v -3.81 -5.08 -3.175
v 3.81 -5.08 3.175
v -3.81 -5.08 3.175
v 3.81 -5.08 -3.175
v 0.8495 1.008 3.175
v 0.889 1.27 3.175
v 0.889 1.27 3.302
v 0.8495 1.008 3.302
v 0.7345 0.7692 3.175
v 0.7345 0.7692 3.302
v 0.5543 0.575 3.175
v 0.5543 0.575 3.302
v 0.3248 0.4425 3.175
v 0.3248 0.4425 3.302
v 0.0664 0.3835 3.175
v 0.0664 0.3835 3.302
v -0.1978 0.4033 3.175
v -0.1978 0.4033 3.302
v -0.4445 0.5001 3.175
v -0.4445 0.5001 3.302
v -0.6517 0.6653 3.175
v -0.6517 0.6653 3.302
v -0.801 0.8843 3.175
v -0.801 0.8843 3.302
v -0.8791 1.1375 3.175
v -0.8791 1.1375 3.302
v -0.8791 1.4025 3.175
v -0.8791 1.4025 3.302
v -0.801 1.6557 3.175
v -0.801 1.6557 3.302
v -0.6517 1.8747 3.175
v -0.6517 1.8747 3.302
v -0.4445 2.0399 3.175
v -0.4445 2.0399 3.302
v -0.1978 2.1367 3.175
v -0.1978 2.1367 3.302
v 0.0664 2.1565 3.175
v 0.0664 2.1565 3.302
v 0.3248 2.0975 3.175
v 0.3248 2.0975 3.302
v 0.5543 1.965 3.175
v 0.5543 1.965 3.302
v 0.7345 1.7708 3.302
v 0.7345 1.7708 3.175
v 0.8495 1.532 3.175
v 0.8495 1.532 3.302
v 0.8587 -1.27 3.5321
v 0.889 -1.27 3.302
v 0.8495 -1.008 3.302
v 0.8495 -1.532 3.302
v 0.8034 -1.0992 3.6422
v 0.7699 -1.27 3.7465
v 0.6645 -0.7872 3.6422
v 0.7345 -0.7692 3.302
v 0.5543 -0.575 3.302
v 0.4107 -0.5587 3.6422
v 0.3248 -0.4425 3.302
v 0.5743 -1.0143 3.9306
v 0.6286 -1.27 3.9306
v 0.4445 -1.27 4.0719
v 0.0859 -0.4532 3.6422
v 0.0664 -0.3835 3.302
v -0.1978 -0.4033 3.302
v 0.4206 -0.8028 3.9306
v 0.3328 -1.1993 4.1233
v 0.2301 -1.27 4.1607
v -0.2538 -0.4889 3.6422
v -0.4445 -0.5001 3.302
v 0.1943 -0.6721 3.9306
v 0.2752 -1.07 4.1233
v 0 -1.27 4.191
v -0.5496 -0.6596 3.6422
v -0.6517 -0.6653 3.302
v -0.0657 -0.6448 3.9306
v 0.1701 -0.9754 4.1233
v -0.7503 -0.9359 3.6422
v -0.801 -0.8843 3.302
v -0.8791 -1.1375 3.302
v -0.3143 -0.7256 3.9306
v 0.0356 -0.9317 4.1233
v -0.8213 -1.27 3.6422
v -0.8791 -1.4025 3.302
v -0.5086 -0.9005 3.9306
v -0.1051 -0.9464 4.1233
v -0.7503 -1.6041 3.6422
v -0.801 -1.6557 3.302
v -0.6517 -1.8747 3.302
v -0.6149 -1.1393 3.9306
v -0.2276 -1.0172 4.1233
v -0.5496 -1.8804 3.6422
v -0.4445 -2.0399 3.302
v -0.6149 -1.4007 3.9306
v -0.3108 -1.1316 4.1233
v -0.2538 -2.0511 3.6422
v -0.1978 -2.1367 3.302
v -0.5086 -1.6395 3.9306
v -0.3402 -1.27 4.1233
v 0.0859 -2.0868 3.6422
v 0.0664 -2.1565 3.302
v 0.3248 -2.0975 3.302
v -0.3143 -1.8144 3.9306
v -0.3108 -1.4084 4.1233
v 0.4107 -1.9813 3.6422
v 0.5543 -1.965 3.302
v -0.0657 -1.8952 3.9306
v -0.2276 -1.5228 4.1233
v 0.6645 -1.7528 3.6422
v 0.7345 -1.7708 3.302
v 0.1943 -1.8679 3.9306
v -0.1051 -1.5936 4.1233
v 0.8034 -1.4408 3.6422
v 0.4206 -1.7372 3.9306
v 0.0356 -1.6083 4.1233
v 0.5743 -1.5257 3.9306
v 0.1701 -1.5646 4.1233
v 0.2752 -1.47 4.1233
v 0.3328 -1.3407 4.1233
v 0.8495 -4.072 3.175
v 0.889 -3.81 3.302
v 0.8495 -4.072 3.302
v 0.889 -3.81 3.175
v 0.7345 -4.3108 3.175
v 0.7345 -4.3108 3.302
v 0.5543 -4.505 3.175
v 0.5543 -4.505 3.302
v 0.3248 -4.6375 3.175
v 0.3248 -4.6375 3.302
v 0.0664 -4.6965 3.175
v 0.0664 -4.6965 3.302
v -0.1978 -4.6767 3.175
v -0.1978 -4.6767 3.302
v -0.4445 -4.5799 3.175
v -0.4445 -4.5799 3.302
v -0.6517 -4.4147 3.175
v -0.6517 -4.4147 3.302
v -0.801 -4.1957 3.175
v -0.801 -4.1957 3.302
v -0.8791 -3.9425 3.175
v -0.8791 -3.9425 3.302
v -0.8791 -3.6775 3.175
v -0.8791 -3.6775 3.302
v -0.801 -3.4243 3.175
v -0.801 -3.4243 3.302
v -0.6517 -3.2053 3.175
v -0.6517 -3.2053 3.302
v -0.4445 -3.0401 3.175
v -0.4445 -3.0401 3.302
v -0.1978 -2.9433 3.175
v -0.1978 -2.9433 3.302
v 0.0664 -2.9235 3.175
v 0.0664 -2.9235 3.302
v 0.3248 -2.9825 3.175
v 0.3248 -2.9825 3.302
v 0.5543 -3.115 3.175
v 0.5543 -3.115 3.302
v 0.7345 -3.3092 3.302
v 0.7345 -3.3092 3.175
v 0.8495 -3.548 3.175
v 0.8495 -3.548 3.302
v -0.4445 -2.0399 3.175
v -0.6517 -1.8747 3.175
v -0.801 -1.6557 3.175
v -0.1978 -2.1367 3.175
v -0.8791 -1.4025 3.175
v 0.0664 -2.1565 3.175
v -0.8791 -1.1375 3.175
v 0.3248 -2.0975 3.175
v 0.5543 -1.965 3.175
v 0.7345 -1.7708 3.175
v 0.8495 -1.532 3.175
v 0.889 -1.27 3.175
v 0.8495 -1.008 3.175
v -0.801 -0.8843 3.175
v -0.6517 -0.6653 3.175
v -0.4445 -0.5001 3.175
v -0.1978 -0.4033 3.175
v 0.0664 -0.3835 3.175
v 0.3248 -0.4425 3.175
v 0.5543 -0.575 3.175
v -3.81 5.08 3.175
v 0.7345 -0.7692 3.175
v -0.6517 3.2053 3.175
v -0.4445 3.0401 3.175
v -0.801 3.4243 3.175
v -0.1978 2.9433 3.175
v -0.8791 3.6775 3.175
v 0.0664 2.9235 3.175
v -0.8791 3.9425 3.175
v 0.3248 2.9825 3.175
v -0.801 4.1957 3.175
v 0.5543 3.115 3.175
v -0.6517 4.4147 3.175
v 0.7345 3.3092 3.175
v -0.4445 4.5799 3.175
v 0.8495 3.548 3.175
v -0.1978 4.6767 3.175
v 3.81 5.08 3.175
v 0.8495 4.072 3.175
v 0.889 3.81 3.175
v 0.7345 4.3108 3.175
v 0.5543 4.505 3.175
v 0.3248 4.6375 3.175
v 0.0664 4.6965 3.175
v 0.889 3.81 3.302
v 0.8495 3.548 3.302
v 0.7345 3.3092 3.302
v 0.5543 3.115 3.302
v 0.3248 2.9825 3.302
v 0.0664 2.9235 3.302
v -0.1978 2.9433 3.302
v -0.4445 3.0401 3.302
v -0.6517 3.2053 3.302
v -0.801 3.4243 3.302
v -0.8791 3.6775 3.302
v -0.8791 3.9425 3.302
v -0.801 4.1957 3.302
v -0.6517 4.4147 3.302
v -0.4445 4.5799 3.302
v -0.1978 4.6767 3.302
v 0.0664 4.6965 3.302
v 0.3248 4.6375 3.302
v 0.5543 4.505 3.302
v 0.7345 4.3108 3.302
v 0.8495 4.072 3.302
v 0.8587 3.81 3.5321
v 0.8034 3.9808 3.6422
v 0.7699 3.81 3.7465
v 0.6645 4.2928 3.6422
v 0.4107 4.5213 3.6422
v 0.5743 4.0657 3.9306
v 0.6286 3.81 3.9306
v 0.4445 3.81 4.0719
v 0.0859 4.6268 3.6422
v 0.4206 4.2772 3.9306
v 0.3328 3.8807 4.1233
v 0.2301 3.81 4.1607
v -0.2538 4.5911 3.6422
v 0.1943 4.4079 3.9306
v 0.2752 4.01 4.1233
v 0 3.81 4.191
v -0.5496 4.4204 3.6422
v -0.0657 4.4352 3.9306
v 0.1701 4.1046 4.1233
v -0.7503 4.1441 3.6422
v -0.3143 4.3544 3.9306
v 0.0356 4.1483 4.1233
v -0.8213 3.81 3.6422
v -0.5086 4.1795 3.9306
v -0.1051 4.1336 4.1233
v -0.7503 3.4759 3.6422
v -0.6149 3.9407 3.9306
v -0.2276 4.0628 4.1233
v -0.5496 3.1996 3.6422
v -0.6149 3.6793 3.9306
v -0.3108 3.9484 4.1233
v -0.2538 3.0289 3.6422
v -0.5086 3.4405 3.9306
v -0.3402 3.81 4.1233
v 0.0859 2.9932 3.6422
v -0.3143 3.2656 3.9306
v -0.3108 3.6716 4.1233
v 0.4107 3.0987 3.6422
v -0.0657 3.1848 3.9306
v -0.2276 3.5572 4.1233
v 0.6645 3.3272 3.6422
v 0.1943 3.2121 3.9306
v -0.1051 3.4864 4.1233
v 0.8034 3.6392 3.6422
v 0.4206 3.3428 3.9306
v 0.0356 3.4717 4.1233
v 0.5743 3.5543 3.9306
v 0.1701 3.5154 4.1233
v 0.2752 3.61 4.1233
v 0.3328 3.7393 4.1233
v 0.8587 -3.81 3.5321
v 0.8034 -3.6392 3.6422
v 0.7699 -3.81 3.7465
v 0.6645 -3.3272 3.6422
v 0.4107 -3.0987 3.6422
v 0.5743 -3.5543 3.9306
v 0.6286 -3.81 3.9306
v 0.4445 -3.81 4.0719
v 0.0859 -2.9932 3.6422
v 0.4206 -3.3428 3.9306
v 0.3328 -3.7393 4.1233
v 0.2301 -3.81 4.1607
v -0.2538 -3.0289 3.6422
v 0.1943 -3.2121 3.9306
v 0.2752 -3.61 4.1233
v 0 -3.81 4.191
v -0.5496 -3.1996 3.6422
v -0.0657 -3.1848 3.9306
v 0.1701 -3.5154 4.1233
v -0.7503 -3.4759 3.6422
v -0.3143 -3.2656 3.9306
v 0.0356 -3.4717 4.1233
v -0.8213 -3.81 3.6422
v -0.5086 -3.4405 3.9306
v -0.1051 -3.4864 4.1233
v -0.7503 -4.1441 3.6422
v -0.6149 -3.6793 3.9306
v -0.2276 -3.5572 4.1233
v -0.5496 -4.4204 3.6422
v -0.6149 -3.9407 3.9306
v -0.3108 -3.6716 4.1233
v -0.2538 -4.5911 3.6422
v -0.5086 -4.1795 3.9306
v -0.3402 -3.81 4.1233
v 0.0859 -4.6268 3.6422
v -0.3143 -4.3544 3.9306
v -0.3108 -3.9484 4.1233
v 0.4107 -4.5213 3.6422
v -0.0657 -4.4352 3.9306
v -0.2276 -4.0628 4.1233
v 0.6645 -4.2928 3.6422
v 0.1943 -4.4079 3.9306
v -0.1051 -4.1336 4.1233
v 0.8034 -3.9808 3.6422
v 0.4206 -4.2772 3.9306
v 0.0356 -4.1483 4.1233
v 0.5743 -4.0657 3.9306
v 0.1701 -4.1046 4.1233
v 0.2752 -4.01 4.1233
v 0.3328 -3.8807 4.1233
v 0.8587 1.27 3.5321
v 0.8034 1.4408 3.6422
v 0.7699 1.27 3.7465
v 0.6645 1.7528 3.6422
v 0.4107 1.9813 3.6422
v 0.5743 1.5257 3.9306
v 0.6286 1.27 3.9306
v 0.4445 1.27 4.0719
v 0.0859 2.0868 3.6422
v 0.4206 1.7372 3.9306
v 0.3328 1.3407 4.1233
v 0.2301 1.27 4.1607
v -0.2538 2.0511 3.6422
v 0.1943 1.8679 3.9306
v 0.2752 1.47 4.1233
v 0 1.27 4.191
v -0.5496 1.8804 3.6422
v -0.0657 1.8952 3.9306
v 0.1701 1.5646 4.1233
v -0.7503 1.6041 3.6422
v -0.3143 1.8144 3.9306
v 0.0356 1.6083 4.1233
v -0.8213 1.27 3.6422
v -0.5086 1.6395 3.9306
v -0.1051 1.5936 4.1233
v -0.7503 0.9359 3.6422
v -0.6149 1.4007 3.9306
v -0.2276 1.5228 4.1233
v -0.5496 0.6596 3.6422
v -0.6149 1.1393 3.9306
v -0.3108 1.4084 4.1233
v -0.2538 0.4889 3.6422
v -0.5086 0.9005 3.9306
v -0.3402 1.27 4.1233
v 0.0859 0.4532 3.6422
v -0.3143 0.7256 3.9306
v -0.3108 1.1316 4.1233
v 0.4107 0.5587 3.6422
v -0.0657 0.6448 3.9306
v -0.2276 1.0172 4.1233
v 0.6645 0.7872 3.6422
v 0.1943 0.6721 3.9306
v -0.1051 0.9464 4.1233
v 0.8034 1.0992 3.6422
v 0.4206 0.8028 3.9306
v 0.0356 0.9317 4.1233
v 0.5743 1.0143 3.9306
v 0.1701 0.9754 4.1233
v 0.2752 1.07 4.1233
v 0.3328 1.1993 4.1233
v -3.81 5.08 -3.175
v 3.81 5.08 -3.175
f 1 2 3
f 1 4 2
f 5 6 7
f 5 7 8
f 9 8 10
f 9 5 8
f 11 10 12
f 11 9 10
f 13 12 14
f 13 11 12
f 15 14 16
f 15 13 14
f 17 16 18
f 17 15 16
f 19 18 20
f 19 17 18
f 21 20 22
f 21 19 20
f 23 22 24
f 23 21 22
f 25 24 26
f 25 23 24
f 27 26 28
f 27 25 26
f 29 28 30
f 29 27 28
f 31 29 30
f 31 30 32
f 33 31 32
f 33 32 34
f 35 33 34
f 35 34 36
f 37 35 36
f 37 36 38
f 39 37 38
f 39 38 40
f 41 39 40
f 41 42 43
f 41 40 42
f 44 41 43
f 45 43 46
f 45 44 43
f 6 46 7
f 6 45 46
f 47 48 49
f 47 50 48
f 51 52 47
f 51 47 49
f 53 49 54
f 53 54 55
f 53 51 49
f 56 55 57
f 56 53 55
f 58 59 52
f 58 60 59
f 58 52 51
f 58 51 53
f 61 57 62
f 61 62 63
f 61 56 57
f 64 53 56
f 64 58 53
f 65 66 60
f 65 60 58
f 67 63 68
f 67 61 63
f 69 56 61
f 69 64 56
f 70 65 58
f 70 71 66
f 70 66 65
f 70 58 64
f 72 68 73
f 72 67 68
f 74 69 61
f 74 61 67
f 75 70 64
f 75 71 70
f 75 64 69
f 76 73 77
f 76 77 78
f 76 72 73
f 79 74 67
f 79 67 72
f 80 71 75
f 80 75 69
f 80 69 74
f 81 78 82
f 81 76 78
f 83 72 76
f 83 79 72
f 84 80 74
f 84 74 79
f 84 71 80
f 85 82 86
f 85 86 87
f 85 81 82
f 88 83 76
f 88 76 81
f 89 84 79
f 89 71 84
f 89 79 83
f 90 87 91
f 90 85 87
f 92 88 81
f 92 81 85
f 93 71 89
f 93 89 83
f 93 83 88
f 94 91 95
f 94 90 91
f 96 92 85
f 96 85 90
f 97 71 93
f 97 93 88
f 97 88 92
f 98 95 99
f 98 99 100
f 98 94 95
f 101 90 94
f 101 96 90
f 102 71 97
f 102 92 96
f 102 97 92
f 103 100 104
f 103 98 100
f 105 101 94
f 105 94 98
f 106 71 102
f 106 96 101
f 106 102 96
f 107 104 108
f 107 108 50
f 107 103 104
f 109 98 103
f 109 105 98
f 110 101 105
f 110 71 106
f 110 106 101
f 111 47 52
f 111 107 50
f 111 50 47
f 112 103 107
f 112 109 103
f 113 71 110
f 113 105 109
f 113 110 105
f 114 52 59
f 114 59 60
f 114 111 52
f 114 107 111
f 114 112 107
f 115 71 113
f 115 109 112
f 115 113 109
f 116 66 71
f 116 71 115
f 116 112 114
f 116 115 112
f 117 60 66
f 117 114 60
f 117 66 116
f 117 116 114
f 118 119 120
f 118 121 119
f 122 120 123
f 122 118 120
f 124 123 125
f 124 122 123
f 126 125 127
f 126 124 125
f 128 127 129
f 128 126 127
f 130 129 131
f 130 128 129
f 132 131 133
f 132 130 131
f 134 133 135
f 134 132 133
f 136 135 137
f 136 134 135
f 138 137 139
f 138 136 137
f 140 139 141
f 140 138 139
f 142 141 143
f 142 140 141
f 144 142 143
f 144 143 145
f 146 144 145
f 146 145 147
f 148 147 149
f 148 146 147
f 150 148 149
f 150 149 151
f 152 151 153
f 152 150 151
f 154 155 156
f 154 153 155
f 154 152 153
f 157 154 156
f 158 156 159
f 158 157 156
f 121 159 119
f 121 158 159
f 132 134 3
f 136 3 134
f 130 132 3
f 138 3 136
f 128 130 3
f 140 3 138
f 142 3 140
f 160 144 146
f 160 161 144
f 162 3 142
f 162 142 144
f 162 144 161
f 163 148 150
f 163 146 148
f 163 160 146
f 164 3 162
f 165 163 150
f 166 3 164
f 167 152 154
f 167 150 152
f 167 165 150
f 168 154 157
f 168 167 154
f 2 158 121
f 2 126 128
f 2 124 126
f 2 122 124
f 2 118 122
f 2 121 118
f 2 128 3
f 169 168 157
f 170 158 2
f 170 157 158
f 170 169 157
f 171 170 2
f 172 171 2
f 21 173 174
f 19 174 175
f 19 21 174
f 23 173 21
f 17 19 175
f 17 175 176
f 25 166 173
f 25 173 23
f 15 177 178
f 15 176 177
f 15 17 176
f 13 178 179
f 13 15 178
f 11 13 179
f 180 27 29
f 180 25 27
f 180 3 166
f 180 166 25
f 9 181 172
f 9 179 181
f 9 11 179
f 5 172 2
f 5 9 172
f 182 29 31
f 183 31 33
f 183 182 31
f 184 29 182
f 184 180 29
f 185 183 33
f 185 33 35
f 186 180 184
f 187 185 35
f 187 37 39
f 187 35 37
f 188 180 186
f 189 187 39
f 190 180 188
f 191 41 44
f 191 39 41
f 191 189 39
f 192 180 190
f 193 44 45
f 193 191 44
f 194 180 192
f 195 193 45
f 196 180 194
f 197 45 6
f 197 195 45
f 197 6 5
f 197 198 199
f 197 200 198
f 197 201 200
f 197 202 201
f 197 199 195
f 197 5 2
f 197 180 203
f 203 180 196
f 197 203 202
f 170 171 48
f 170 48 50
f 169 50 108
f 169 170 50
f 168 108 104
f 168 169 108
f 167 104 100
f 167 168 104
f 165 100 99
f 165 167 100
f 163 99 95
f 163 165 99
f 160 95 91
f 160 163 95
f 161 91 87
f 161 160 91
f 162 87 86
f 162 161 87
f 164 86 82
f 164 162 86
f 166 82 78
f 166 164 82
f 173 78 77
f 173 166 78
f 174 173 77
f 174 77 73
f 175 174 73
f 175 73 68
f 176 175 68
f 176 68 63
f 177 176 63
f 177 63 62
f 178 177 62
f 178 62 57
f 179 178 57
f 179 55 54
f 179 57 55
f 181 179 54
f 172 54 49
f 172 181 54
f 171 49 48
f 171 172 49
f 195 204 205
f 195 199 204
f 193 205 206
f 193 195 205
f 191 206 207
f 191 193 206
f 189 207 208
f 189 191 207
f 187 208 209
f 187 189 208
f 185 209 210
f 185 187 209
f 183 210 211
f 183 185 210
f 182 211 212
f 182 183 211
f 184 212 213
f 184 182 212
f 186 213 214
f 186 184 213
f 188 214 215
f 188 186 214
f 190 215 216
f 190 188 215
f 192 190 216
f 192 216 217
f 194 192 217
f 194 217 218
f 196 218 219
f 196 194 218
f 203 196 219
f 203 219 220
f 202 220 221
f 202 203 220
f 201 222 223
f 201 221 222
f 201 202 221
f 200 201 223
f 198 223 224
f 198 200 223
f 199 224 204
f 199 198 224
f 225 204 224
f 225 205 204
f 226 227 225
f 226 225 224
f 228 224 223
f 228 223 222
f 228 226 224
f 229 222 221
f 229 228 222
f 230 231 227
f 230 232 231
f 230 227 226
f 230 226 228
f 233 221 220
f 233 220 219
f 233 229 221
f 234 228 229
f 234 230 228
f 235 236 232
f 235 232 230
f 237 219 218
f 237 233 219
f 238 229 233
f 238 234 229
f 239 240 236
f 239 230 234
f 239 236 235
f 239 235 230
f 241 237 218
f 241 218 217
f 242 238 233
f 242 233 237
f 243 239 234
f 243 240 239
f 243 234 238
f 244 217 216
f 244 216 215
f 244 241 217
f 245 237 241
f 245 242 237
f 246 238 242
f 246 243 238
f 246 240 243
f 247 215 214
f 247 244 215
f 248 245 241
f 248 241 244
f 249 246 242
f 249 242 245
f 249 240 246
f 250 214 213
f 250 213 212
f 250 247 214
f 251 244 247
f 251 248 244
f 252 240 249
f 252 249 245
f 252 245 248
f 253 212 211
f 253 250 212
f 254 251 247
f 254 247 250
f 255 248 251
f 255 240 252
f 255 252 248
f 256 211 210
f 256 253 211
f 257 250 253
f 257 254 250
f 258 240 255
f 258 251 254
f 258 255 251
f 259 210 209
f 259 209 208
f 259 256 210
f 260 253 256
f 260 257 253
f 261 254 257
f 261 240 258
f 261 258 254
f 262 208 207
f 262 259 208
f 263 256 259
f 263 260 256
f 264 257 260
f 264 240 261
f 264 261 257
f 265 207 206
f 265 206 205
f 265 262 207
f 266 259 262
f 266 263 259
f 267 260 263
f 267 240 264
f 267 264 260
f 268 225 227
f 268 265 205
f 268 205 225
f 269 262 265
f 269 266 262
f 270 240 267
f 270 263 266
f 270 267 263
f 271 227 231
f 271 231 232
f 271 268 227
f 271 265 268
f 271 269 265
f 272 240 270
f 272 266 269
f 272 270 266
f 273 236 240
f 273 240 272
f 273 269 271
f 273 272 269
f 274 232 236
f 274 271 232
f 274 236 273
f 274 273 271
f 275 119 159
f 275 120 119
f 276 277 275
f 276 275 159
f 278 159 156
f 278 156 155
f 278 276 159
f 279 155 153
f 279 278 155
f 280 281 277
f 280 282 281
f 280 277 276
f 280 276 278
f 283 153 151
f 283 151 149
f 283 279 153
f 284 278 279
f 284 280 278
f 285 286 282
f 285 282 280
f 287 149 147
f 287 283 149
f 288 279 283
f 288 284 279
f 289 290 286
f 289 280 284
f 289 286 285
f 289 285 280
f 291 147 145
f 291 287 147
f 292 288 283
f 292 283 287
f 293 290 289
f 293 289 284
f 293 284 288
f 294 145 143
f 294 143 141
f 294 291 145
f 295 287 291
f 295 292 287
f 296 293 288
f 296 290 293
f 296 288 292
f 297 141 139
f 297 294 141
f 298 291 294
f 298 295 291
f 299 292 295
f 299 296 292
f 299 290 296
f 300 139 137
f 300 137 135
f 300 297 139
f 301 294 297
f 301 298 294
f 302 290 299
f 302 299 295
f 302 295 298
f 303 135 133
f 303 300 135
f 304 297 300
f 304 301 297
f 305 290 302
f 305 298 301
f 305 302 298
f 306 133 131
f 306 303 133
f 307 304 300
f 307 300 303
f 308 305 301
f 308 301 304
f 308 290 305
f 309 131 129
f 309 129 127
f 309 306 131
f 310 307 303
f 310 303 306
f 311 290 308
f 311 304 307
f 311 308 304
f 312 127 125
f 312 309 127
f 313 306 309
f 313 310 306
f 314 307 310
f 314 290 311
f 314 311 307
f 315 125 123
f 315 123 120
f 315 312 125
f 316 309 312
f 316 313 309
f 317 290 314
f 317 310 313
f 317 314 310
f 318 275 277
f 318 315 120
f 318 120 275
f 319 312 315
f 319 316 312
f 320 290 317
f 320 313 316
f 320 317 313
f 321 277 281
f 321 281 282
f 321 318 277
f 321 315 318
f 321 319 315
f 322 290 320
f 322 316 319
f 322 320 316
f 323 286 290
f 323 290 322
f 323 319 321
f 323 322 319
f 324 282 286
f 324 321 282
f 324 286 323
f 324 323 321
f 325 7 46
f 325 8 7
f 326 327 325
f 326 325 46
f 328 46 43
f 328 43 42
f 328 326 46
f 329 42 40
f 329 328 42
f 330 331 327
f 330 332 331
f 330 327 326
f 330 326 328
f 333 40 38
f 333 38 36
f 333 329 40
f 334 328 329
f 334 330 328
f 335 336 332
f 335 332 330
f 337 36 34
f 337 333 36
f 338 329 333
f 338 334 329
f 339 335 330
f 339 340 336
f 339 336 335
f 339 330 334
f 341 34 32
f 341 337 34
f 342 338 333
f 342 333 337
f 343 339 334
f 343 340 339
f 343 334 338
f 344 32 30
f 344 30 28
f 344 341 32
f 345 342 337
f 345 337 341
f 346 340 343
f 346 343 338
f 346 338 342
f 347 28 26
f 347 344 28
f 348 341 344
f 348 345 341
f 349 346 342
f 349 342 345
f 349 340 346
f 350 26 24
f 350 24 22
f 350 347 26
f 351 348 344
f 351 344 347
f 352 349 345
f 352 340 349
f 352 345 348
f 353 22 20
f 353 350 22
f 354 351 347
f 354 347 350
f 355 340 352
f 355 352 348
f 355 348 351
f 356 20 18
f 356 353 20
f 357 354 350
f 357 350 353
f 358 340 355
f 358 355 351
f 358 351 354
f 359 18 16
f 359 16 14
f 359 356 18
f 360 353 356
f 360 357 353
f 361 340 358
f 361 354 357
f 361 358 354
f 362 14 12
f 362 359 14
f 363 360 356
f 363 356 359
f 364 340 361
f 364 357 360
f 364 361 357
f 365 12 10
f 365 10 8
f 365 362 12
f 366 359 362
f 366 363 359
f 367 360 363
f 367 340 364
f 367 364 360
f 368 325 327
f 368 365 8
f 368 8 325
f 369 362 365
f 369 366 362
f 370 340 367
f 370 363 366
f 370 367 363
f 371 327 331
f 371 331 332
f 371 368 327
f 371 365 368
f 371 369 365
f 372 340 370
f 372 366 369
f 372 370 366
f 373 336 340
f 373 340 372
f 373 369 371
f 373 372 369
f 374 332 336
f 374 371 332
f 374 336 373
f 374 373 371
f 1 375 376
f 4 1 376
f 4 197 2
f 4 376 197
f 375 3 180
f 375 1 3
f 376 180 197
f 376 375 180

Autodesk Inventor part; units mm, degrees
ref_plane "YZ Plane" through (0, 0, 0) normal (1, 0, 0) x (0, 1, 0)
ref_plane "XZ Plane" through (0, 0, 0) normal (0, 1, 0) x (-1, 0, 0)
ref_plane "XY Plane" through (0, 0, 0) normal (0, 0, 1) x (1, 0, 0)
sketch "Sketch1" plane through (0, 0, 0) normal (0, 0, 1) x (1, 0, 0)
  line L0 (-3.81, 5.08) -> (3.81, 5.08)
  line L1 (3.81, 5.08) -> (3.81, -5.08)
  line L2 (3.81, -5.08) -> (-3.81, -5.08)
  line L3 (-3.81, -5.08) -> (-3.81, 5.08)
  line L4 (0, 0) -> (0, 5.08) construction
  line L5 (0, 0) -> (0, -5.08) construction
  line L6 (0, 0) -> (-3.81, 0) construction
  line L7 (0, 0) -> (3.81, 0) construction
  dimension "d0" = 7.62
  dimension "d1" = 10.16
extrude "Extrusion1" add sketch "Sketch1" along normal mid plane 6.35
sketch "Sketch2" plane through (0, 0, 3.175) normal (0, 0, 1) x (1, 0, 0)
  line L0 (-3.81, 5.08) -> (3.81, 5.08) projected
  line L1 (3.81, -5.08) -> (-3.81, -5.08) projected
  line L2 (0, 5.08) -> (0, -5.08) construction
  circle A0 centre (0, 3.81) radius 0.889
  line L3 (-3.81, -5.08) -> (-3.81, 5.08) projected
  circle A1 centre (0, 1.27) radius 0.889
  circle A2 centre (0, -1.27) radius 0.889
  circle A3 centre (0, -3.81) radius 0.889
  dimension "d4" = 1.27
  dimension "d5" = 1.778
  dimension "d14" = 2.54
extrude "Extrusion2" add sketch "Sketch2" along normal blind 1.016 contours A0
fillet "Fillet1" radius 0.889 1 edges at (-0.889, 3.81, 4.191)
extrude "Extrusion3" add sketch "Sketch2" along normal blind 1.016 contours A1
fillet "Fillet2" radius 0.889 1 edges at (-0.889, 1.27, 4.191)
extrude "Extrusion4" add sketch "Sketch2" along normal blind 1.016 contours A2
fillet "Fillet3" radius 0.889 1 edges at (-0.889, -1.27, 4.191)
extrude "Extrusion5" add sketch "Sketch2" along normal blind 1.016 contours A3
fillet "Fillet4" radius 0.889 1 edges at (-0.889, -3.81, 4.191)
properties part number "cRIO-FRC LED"
